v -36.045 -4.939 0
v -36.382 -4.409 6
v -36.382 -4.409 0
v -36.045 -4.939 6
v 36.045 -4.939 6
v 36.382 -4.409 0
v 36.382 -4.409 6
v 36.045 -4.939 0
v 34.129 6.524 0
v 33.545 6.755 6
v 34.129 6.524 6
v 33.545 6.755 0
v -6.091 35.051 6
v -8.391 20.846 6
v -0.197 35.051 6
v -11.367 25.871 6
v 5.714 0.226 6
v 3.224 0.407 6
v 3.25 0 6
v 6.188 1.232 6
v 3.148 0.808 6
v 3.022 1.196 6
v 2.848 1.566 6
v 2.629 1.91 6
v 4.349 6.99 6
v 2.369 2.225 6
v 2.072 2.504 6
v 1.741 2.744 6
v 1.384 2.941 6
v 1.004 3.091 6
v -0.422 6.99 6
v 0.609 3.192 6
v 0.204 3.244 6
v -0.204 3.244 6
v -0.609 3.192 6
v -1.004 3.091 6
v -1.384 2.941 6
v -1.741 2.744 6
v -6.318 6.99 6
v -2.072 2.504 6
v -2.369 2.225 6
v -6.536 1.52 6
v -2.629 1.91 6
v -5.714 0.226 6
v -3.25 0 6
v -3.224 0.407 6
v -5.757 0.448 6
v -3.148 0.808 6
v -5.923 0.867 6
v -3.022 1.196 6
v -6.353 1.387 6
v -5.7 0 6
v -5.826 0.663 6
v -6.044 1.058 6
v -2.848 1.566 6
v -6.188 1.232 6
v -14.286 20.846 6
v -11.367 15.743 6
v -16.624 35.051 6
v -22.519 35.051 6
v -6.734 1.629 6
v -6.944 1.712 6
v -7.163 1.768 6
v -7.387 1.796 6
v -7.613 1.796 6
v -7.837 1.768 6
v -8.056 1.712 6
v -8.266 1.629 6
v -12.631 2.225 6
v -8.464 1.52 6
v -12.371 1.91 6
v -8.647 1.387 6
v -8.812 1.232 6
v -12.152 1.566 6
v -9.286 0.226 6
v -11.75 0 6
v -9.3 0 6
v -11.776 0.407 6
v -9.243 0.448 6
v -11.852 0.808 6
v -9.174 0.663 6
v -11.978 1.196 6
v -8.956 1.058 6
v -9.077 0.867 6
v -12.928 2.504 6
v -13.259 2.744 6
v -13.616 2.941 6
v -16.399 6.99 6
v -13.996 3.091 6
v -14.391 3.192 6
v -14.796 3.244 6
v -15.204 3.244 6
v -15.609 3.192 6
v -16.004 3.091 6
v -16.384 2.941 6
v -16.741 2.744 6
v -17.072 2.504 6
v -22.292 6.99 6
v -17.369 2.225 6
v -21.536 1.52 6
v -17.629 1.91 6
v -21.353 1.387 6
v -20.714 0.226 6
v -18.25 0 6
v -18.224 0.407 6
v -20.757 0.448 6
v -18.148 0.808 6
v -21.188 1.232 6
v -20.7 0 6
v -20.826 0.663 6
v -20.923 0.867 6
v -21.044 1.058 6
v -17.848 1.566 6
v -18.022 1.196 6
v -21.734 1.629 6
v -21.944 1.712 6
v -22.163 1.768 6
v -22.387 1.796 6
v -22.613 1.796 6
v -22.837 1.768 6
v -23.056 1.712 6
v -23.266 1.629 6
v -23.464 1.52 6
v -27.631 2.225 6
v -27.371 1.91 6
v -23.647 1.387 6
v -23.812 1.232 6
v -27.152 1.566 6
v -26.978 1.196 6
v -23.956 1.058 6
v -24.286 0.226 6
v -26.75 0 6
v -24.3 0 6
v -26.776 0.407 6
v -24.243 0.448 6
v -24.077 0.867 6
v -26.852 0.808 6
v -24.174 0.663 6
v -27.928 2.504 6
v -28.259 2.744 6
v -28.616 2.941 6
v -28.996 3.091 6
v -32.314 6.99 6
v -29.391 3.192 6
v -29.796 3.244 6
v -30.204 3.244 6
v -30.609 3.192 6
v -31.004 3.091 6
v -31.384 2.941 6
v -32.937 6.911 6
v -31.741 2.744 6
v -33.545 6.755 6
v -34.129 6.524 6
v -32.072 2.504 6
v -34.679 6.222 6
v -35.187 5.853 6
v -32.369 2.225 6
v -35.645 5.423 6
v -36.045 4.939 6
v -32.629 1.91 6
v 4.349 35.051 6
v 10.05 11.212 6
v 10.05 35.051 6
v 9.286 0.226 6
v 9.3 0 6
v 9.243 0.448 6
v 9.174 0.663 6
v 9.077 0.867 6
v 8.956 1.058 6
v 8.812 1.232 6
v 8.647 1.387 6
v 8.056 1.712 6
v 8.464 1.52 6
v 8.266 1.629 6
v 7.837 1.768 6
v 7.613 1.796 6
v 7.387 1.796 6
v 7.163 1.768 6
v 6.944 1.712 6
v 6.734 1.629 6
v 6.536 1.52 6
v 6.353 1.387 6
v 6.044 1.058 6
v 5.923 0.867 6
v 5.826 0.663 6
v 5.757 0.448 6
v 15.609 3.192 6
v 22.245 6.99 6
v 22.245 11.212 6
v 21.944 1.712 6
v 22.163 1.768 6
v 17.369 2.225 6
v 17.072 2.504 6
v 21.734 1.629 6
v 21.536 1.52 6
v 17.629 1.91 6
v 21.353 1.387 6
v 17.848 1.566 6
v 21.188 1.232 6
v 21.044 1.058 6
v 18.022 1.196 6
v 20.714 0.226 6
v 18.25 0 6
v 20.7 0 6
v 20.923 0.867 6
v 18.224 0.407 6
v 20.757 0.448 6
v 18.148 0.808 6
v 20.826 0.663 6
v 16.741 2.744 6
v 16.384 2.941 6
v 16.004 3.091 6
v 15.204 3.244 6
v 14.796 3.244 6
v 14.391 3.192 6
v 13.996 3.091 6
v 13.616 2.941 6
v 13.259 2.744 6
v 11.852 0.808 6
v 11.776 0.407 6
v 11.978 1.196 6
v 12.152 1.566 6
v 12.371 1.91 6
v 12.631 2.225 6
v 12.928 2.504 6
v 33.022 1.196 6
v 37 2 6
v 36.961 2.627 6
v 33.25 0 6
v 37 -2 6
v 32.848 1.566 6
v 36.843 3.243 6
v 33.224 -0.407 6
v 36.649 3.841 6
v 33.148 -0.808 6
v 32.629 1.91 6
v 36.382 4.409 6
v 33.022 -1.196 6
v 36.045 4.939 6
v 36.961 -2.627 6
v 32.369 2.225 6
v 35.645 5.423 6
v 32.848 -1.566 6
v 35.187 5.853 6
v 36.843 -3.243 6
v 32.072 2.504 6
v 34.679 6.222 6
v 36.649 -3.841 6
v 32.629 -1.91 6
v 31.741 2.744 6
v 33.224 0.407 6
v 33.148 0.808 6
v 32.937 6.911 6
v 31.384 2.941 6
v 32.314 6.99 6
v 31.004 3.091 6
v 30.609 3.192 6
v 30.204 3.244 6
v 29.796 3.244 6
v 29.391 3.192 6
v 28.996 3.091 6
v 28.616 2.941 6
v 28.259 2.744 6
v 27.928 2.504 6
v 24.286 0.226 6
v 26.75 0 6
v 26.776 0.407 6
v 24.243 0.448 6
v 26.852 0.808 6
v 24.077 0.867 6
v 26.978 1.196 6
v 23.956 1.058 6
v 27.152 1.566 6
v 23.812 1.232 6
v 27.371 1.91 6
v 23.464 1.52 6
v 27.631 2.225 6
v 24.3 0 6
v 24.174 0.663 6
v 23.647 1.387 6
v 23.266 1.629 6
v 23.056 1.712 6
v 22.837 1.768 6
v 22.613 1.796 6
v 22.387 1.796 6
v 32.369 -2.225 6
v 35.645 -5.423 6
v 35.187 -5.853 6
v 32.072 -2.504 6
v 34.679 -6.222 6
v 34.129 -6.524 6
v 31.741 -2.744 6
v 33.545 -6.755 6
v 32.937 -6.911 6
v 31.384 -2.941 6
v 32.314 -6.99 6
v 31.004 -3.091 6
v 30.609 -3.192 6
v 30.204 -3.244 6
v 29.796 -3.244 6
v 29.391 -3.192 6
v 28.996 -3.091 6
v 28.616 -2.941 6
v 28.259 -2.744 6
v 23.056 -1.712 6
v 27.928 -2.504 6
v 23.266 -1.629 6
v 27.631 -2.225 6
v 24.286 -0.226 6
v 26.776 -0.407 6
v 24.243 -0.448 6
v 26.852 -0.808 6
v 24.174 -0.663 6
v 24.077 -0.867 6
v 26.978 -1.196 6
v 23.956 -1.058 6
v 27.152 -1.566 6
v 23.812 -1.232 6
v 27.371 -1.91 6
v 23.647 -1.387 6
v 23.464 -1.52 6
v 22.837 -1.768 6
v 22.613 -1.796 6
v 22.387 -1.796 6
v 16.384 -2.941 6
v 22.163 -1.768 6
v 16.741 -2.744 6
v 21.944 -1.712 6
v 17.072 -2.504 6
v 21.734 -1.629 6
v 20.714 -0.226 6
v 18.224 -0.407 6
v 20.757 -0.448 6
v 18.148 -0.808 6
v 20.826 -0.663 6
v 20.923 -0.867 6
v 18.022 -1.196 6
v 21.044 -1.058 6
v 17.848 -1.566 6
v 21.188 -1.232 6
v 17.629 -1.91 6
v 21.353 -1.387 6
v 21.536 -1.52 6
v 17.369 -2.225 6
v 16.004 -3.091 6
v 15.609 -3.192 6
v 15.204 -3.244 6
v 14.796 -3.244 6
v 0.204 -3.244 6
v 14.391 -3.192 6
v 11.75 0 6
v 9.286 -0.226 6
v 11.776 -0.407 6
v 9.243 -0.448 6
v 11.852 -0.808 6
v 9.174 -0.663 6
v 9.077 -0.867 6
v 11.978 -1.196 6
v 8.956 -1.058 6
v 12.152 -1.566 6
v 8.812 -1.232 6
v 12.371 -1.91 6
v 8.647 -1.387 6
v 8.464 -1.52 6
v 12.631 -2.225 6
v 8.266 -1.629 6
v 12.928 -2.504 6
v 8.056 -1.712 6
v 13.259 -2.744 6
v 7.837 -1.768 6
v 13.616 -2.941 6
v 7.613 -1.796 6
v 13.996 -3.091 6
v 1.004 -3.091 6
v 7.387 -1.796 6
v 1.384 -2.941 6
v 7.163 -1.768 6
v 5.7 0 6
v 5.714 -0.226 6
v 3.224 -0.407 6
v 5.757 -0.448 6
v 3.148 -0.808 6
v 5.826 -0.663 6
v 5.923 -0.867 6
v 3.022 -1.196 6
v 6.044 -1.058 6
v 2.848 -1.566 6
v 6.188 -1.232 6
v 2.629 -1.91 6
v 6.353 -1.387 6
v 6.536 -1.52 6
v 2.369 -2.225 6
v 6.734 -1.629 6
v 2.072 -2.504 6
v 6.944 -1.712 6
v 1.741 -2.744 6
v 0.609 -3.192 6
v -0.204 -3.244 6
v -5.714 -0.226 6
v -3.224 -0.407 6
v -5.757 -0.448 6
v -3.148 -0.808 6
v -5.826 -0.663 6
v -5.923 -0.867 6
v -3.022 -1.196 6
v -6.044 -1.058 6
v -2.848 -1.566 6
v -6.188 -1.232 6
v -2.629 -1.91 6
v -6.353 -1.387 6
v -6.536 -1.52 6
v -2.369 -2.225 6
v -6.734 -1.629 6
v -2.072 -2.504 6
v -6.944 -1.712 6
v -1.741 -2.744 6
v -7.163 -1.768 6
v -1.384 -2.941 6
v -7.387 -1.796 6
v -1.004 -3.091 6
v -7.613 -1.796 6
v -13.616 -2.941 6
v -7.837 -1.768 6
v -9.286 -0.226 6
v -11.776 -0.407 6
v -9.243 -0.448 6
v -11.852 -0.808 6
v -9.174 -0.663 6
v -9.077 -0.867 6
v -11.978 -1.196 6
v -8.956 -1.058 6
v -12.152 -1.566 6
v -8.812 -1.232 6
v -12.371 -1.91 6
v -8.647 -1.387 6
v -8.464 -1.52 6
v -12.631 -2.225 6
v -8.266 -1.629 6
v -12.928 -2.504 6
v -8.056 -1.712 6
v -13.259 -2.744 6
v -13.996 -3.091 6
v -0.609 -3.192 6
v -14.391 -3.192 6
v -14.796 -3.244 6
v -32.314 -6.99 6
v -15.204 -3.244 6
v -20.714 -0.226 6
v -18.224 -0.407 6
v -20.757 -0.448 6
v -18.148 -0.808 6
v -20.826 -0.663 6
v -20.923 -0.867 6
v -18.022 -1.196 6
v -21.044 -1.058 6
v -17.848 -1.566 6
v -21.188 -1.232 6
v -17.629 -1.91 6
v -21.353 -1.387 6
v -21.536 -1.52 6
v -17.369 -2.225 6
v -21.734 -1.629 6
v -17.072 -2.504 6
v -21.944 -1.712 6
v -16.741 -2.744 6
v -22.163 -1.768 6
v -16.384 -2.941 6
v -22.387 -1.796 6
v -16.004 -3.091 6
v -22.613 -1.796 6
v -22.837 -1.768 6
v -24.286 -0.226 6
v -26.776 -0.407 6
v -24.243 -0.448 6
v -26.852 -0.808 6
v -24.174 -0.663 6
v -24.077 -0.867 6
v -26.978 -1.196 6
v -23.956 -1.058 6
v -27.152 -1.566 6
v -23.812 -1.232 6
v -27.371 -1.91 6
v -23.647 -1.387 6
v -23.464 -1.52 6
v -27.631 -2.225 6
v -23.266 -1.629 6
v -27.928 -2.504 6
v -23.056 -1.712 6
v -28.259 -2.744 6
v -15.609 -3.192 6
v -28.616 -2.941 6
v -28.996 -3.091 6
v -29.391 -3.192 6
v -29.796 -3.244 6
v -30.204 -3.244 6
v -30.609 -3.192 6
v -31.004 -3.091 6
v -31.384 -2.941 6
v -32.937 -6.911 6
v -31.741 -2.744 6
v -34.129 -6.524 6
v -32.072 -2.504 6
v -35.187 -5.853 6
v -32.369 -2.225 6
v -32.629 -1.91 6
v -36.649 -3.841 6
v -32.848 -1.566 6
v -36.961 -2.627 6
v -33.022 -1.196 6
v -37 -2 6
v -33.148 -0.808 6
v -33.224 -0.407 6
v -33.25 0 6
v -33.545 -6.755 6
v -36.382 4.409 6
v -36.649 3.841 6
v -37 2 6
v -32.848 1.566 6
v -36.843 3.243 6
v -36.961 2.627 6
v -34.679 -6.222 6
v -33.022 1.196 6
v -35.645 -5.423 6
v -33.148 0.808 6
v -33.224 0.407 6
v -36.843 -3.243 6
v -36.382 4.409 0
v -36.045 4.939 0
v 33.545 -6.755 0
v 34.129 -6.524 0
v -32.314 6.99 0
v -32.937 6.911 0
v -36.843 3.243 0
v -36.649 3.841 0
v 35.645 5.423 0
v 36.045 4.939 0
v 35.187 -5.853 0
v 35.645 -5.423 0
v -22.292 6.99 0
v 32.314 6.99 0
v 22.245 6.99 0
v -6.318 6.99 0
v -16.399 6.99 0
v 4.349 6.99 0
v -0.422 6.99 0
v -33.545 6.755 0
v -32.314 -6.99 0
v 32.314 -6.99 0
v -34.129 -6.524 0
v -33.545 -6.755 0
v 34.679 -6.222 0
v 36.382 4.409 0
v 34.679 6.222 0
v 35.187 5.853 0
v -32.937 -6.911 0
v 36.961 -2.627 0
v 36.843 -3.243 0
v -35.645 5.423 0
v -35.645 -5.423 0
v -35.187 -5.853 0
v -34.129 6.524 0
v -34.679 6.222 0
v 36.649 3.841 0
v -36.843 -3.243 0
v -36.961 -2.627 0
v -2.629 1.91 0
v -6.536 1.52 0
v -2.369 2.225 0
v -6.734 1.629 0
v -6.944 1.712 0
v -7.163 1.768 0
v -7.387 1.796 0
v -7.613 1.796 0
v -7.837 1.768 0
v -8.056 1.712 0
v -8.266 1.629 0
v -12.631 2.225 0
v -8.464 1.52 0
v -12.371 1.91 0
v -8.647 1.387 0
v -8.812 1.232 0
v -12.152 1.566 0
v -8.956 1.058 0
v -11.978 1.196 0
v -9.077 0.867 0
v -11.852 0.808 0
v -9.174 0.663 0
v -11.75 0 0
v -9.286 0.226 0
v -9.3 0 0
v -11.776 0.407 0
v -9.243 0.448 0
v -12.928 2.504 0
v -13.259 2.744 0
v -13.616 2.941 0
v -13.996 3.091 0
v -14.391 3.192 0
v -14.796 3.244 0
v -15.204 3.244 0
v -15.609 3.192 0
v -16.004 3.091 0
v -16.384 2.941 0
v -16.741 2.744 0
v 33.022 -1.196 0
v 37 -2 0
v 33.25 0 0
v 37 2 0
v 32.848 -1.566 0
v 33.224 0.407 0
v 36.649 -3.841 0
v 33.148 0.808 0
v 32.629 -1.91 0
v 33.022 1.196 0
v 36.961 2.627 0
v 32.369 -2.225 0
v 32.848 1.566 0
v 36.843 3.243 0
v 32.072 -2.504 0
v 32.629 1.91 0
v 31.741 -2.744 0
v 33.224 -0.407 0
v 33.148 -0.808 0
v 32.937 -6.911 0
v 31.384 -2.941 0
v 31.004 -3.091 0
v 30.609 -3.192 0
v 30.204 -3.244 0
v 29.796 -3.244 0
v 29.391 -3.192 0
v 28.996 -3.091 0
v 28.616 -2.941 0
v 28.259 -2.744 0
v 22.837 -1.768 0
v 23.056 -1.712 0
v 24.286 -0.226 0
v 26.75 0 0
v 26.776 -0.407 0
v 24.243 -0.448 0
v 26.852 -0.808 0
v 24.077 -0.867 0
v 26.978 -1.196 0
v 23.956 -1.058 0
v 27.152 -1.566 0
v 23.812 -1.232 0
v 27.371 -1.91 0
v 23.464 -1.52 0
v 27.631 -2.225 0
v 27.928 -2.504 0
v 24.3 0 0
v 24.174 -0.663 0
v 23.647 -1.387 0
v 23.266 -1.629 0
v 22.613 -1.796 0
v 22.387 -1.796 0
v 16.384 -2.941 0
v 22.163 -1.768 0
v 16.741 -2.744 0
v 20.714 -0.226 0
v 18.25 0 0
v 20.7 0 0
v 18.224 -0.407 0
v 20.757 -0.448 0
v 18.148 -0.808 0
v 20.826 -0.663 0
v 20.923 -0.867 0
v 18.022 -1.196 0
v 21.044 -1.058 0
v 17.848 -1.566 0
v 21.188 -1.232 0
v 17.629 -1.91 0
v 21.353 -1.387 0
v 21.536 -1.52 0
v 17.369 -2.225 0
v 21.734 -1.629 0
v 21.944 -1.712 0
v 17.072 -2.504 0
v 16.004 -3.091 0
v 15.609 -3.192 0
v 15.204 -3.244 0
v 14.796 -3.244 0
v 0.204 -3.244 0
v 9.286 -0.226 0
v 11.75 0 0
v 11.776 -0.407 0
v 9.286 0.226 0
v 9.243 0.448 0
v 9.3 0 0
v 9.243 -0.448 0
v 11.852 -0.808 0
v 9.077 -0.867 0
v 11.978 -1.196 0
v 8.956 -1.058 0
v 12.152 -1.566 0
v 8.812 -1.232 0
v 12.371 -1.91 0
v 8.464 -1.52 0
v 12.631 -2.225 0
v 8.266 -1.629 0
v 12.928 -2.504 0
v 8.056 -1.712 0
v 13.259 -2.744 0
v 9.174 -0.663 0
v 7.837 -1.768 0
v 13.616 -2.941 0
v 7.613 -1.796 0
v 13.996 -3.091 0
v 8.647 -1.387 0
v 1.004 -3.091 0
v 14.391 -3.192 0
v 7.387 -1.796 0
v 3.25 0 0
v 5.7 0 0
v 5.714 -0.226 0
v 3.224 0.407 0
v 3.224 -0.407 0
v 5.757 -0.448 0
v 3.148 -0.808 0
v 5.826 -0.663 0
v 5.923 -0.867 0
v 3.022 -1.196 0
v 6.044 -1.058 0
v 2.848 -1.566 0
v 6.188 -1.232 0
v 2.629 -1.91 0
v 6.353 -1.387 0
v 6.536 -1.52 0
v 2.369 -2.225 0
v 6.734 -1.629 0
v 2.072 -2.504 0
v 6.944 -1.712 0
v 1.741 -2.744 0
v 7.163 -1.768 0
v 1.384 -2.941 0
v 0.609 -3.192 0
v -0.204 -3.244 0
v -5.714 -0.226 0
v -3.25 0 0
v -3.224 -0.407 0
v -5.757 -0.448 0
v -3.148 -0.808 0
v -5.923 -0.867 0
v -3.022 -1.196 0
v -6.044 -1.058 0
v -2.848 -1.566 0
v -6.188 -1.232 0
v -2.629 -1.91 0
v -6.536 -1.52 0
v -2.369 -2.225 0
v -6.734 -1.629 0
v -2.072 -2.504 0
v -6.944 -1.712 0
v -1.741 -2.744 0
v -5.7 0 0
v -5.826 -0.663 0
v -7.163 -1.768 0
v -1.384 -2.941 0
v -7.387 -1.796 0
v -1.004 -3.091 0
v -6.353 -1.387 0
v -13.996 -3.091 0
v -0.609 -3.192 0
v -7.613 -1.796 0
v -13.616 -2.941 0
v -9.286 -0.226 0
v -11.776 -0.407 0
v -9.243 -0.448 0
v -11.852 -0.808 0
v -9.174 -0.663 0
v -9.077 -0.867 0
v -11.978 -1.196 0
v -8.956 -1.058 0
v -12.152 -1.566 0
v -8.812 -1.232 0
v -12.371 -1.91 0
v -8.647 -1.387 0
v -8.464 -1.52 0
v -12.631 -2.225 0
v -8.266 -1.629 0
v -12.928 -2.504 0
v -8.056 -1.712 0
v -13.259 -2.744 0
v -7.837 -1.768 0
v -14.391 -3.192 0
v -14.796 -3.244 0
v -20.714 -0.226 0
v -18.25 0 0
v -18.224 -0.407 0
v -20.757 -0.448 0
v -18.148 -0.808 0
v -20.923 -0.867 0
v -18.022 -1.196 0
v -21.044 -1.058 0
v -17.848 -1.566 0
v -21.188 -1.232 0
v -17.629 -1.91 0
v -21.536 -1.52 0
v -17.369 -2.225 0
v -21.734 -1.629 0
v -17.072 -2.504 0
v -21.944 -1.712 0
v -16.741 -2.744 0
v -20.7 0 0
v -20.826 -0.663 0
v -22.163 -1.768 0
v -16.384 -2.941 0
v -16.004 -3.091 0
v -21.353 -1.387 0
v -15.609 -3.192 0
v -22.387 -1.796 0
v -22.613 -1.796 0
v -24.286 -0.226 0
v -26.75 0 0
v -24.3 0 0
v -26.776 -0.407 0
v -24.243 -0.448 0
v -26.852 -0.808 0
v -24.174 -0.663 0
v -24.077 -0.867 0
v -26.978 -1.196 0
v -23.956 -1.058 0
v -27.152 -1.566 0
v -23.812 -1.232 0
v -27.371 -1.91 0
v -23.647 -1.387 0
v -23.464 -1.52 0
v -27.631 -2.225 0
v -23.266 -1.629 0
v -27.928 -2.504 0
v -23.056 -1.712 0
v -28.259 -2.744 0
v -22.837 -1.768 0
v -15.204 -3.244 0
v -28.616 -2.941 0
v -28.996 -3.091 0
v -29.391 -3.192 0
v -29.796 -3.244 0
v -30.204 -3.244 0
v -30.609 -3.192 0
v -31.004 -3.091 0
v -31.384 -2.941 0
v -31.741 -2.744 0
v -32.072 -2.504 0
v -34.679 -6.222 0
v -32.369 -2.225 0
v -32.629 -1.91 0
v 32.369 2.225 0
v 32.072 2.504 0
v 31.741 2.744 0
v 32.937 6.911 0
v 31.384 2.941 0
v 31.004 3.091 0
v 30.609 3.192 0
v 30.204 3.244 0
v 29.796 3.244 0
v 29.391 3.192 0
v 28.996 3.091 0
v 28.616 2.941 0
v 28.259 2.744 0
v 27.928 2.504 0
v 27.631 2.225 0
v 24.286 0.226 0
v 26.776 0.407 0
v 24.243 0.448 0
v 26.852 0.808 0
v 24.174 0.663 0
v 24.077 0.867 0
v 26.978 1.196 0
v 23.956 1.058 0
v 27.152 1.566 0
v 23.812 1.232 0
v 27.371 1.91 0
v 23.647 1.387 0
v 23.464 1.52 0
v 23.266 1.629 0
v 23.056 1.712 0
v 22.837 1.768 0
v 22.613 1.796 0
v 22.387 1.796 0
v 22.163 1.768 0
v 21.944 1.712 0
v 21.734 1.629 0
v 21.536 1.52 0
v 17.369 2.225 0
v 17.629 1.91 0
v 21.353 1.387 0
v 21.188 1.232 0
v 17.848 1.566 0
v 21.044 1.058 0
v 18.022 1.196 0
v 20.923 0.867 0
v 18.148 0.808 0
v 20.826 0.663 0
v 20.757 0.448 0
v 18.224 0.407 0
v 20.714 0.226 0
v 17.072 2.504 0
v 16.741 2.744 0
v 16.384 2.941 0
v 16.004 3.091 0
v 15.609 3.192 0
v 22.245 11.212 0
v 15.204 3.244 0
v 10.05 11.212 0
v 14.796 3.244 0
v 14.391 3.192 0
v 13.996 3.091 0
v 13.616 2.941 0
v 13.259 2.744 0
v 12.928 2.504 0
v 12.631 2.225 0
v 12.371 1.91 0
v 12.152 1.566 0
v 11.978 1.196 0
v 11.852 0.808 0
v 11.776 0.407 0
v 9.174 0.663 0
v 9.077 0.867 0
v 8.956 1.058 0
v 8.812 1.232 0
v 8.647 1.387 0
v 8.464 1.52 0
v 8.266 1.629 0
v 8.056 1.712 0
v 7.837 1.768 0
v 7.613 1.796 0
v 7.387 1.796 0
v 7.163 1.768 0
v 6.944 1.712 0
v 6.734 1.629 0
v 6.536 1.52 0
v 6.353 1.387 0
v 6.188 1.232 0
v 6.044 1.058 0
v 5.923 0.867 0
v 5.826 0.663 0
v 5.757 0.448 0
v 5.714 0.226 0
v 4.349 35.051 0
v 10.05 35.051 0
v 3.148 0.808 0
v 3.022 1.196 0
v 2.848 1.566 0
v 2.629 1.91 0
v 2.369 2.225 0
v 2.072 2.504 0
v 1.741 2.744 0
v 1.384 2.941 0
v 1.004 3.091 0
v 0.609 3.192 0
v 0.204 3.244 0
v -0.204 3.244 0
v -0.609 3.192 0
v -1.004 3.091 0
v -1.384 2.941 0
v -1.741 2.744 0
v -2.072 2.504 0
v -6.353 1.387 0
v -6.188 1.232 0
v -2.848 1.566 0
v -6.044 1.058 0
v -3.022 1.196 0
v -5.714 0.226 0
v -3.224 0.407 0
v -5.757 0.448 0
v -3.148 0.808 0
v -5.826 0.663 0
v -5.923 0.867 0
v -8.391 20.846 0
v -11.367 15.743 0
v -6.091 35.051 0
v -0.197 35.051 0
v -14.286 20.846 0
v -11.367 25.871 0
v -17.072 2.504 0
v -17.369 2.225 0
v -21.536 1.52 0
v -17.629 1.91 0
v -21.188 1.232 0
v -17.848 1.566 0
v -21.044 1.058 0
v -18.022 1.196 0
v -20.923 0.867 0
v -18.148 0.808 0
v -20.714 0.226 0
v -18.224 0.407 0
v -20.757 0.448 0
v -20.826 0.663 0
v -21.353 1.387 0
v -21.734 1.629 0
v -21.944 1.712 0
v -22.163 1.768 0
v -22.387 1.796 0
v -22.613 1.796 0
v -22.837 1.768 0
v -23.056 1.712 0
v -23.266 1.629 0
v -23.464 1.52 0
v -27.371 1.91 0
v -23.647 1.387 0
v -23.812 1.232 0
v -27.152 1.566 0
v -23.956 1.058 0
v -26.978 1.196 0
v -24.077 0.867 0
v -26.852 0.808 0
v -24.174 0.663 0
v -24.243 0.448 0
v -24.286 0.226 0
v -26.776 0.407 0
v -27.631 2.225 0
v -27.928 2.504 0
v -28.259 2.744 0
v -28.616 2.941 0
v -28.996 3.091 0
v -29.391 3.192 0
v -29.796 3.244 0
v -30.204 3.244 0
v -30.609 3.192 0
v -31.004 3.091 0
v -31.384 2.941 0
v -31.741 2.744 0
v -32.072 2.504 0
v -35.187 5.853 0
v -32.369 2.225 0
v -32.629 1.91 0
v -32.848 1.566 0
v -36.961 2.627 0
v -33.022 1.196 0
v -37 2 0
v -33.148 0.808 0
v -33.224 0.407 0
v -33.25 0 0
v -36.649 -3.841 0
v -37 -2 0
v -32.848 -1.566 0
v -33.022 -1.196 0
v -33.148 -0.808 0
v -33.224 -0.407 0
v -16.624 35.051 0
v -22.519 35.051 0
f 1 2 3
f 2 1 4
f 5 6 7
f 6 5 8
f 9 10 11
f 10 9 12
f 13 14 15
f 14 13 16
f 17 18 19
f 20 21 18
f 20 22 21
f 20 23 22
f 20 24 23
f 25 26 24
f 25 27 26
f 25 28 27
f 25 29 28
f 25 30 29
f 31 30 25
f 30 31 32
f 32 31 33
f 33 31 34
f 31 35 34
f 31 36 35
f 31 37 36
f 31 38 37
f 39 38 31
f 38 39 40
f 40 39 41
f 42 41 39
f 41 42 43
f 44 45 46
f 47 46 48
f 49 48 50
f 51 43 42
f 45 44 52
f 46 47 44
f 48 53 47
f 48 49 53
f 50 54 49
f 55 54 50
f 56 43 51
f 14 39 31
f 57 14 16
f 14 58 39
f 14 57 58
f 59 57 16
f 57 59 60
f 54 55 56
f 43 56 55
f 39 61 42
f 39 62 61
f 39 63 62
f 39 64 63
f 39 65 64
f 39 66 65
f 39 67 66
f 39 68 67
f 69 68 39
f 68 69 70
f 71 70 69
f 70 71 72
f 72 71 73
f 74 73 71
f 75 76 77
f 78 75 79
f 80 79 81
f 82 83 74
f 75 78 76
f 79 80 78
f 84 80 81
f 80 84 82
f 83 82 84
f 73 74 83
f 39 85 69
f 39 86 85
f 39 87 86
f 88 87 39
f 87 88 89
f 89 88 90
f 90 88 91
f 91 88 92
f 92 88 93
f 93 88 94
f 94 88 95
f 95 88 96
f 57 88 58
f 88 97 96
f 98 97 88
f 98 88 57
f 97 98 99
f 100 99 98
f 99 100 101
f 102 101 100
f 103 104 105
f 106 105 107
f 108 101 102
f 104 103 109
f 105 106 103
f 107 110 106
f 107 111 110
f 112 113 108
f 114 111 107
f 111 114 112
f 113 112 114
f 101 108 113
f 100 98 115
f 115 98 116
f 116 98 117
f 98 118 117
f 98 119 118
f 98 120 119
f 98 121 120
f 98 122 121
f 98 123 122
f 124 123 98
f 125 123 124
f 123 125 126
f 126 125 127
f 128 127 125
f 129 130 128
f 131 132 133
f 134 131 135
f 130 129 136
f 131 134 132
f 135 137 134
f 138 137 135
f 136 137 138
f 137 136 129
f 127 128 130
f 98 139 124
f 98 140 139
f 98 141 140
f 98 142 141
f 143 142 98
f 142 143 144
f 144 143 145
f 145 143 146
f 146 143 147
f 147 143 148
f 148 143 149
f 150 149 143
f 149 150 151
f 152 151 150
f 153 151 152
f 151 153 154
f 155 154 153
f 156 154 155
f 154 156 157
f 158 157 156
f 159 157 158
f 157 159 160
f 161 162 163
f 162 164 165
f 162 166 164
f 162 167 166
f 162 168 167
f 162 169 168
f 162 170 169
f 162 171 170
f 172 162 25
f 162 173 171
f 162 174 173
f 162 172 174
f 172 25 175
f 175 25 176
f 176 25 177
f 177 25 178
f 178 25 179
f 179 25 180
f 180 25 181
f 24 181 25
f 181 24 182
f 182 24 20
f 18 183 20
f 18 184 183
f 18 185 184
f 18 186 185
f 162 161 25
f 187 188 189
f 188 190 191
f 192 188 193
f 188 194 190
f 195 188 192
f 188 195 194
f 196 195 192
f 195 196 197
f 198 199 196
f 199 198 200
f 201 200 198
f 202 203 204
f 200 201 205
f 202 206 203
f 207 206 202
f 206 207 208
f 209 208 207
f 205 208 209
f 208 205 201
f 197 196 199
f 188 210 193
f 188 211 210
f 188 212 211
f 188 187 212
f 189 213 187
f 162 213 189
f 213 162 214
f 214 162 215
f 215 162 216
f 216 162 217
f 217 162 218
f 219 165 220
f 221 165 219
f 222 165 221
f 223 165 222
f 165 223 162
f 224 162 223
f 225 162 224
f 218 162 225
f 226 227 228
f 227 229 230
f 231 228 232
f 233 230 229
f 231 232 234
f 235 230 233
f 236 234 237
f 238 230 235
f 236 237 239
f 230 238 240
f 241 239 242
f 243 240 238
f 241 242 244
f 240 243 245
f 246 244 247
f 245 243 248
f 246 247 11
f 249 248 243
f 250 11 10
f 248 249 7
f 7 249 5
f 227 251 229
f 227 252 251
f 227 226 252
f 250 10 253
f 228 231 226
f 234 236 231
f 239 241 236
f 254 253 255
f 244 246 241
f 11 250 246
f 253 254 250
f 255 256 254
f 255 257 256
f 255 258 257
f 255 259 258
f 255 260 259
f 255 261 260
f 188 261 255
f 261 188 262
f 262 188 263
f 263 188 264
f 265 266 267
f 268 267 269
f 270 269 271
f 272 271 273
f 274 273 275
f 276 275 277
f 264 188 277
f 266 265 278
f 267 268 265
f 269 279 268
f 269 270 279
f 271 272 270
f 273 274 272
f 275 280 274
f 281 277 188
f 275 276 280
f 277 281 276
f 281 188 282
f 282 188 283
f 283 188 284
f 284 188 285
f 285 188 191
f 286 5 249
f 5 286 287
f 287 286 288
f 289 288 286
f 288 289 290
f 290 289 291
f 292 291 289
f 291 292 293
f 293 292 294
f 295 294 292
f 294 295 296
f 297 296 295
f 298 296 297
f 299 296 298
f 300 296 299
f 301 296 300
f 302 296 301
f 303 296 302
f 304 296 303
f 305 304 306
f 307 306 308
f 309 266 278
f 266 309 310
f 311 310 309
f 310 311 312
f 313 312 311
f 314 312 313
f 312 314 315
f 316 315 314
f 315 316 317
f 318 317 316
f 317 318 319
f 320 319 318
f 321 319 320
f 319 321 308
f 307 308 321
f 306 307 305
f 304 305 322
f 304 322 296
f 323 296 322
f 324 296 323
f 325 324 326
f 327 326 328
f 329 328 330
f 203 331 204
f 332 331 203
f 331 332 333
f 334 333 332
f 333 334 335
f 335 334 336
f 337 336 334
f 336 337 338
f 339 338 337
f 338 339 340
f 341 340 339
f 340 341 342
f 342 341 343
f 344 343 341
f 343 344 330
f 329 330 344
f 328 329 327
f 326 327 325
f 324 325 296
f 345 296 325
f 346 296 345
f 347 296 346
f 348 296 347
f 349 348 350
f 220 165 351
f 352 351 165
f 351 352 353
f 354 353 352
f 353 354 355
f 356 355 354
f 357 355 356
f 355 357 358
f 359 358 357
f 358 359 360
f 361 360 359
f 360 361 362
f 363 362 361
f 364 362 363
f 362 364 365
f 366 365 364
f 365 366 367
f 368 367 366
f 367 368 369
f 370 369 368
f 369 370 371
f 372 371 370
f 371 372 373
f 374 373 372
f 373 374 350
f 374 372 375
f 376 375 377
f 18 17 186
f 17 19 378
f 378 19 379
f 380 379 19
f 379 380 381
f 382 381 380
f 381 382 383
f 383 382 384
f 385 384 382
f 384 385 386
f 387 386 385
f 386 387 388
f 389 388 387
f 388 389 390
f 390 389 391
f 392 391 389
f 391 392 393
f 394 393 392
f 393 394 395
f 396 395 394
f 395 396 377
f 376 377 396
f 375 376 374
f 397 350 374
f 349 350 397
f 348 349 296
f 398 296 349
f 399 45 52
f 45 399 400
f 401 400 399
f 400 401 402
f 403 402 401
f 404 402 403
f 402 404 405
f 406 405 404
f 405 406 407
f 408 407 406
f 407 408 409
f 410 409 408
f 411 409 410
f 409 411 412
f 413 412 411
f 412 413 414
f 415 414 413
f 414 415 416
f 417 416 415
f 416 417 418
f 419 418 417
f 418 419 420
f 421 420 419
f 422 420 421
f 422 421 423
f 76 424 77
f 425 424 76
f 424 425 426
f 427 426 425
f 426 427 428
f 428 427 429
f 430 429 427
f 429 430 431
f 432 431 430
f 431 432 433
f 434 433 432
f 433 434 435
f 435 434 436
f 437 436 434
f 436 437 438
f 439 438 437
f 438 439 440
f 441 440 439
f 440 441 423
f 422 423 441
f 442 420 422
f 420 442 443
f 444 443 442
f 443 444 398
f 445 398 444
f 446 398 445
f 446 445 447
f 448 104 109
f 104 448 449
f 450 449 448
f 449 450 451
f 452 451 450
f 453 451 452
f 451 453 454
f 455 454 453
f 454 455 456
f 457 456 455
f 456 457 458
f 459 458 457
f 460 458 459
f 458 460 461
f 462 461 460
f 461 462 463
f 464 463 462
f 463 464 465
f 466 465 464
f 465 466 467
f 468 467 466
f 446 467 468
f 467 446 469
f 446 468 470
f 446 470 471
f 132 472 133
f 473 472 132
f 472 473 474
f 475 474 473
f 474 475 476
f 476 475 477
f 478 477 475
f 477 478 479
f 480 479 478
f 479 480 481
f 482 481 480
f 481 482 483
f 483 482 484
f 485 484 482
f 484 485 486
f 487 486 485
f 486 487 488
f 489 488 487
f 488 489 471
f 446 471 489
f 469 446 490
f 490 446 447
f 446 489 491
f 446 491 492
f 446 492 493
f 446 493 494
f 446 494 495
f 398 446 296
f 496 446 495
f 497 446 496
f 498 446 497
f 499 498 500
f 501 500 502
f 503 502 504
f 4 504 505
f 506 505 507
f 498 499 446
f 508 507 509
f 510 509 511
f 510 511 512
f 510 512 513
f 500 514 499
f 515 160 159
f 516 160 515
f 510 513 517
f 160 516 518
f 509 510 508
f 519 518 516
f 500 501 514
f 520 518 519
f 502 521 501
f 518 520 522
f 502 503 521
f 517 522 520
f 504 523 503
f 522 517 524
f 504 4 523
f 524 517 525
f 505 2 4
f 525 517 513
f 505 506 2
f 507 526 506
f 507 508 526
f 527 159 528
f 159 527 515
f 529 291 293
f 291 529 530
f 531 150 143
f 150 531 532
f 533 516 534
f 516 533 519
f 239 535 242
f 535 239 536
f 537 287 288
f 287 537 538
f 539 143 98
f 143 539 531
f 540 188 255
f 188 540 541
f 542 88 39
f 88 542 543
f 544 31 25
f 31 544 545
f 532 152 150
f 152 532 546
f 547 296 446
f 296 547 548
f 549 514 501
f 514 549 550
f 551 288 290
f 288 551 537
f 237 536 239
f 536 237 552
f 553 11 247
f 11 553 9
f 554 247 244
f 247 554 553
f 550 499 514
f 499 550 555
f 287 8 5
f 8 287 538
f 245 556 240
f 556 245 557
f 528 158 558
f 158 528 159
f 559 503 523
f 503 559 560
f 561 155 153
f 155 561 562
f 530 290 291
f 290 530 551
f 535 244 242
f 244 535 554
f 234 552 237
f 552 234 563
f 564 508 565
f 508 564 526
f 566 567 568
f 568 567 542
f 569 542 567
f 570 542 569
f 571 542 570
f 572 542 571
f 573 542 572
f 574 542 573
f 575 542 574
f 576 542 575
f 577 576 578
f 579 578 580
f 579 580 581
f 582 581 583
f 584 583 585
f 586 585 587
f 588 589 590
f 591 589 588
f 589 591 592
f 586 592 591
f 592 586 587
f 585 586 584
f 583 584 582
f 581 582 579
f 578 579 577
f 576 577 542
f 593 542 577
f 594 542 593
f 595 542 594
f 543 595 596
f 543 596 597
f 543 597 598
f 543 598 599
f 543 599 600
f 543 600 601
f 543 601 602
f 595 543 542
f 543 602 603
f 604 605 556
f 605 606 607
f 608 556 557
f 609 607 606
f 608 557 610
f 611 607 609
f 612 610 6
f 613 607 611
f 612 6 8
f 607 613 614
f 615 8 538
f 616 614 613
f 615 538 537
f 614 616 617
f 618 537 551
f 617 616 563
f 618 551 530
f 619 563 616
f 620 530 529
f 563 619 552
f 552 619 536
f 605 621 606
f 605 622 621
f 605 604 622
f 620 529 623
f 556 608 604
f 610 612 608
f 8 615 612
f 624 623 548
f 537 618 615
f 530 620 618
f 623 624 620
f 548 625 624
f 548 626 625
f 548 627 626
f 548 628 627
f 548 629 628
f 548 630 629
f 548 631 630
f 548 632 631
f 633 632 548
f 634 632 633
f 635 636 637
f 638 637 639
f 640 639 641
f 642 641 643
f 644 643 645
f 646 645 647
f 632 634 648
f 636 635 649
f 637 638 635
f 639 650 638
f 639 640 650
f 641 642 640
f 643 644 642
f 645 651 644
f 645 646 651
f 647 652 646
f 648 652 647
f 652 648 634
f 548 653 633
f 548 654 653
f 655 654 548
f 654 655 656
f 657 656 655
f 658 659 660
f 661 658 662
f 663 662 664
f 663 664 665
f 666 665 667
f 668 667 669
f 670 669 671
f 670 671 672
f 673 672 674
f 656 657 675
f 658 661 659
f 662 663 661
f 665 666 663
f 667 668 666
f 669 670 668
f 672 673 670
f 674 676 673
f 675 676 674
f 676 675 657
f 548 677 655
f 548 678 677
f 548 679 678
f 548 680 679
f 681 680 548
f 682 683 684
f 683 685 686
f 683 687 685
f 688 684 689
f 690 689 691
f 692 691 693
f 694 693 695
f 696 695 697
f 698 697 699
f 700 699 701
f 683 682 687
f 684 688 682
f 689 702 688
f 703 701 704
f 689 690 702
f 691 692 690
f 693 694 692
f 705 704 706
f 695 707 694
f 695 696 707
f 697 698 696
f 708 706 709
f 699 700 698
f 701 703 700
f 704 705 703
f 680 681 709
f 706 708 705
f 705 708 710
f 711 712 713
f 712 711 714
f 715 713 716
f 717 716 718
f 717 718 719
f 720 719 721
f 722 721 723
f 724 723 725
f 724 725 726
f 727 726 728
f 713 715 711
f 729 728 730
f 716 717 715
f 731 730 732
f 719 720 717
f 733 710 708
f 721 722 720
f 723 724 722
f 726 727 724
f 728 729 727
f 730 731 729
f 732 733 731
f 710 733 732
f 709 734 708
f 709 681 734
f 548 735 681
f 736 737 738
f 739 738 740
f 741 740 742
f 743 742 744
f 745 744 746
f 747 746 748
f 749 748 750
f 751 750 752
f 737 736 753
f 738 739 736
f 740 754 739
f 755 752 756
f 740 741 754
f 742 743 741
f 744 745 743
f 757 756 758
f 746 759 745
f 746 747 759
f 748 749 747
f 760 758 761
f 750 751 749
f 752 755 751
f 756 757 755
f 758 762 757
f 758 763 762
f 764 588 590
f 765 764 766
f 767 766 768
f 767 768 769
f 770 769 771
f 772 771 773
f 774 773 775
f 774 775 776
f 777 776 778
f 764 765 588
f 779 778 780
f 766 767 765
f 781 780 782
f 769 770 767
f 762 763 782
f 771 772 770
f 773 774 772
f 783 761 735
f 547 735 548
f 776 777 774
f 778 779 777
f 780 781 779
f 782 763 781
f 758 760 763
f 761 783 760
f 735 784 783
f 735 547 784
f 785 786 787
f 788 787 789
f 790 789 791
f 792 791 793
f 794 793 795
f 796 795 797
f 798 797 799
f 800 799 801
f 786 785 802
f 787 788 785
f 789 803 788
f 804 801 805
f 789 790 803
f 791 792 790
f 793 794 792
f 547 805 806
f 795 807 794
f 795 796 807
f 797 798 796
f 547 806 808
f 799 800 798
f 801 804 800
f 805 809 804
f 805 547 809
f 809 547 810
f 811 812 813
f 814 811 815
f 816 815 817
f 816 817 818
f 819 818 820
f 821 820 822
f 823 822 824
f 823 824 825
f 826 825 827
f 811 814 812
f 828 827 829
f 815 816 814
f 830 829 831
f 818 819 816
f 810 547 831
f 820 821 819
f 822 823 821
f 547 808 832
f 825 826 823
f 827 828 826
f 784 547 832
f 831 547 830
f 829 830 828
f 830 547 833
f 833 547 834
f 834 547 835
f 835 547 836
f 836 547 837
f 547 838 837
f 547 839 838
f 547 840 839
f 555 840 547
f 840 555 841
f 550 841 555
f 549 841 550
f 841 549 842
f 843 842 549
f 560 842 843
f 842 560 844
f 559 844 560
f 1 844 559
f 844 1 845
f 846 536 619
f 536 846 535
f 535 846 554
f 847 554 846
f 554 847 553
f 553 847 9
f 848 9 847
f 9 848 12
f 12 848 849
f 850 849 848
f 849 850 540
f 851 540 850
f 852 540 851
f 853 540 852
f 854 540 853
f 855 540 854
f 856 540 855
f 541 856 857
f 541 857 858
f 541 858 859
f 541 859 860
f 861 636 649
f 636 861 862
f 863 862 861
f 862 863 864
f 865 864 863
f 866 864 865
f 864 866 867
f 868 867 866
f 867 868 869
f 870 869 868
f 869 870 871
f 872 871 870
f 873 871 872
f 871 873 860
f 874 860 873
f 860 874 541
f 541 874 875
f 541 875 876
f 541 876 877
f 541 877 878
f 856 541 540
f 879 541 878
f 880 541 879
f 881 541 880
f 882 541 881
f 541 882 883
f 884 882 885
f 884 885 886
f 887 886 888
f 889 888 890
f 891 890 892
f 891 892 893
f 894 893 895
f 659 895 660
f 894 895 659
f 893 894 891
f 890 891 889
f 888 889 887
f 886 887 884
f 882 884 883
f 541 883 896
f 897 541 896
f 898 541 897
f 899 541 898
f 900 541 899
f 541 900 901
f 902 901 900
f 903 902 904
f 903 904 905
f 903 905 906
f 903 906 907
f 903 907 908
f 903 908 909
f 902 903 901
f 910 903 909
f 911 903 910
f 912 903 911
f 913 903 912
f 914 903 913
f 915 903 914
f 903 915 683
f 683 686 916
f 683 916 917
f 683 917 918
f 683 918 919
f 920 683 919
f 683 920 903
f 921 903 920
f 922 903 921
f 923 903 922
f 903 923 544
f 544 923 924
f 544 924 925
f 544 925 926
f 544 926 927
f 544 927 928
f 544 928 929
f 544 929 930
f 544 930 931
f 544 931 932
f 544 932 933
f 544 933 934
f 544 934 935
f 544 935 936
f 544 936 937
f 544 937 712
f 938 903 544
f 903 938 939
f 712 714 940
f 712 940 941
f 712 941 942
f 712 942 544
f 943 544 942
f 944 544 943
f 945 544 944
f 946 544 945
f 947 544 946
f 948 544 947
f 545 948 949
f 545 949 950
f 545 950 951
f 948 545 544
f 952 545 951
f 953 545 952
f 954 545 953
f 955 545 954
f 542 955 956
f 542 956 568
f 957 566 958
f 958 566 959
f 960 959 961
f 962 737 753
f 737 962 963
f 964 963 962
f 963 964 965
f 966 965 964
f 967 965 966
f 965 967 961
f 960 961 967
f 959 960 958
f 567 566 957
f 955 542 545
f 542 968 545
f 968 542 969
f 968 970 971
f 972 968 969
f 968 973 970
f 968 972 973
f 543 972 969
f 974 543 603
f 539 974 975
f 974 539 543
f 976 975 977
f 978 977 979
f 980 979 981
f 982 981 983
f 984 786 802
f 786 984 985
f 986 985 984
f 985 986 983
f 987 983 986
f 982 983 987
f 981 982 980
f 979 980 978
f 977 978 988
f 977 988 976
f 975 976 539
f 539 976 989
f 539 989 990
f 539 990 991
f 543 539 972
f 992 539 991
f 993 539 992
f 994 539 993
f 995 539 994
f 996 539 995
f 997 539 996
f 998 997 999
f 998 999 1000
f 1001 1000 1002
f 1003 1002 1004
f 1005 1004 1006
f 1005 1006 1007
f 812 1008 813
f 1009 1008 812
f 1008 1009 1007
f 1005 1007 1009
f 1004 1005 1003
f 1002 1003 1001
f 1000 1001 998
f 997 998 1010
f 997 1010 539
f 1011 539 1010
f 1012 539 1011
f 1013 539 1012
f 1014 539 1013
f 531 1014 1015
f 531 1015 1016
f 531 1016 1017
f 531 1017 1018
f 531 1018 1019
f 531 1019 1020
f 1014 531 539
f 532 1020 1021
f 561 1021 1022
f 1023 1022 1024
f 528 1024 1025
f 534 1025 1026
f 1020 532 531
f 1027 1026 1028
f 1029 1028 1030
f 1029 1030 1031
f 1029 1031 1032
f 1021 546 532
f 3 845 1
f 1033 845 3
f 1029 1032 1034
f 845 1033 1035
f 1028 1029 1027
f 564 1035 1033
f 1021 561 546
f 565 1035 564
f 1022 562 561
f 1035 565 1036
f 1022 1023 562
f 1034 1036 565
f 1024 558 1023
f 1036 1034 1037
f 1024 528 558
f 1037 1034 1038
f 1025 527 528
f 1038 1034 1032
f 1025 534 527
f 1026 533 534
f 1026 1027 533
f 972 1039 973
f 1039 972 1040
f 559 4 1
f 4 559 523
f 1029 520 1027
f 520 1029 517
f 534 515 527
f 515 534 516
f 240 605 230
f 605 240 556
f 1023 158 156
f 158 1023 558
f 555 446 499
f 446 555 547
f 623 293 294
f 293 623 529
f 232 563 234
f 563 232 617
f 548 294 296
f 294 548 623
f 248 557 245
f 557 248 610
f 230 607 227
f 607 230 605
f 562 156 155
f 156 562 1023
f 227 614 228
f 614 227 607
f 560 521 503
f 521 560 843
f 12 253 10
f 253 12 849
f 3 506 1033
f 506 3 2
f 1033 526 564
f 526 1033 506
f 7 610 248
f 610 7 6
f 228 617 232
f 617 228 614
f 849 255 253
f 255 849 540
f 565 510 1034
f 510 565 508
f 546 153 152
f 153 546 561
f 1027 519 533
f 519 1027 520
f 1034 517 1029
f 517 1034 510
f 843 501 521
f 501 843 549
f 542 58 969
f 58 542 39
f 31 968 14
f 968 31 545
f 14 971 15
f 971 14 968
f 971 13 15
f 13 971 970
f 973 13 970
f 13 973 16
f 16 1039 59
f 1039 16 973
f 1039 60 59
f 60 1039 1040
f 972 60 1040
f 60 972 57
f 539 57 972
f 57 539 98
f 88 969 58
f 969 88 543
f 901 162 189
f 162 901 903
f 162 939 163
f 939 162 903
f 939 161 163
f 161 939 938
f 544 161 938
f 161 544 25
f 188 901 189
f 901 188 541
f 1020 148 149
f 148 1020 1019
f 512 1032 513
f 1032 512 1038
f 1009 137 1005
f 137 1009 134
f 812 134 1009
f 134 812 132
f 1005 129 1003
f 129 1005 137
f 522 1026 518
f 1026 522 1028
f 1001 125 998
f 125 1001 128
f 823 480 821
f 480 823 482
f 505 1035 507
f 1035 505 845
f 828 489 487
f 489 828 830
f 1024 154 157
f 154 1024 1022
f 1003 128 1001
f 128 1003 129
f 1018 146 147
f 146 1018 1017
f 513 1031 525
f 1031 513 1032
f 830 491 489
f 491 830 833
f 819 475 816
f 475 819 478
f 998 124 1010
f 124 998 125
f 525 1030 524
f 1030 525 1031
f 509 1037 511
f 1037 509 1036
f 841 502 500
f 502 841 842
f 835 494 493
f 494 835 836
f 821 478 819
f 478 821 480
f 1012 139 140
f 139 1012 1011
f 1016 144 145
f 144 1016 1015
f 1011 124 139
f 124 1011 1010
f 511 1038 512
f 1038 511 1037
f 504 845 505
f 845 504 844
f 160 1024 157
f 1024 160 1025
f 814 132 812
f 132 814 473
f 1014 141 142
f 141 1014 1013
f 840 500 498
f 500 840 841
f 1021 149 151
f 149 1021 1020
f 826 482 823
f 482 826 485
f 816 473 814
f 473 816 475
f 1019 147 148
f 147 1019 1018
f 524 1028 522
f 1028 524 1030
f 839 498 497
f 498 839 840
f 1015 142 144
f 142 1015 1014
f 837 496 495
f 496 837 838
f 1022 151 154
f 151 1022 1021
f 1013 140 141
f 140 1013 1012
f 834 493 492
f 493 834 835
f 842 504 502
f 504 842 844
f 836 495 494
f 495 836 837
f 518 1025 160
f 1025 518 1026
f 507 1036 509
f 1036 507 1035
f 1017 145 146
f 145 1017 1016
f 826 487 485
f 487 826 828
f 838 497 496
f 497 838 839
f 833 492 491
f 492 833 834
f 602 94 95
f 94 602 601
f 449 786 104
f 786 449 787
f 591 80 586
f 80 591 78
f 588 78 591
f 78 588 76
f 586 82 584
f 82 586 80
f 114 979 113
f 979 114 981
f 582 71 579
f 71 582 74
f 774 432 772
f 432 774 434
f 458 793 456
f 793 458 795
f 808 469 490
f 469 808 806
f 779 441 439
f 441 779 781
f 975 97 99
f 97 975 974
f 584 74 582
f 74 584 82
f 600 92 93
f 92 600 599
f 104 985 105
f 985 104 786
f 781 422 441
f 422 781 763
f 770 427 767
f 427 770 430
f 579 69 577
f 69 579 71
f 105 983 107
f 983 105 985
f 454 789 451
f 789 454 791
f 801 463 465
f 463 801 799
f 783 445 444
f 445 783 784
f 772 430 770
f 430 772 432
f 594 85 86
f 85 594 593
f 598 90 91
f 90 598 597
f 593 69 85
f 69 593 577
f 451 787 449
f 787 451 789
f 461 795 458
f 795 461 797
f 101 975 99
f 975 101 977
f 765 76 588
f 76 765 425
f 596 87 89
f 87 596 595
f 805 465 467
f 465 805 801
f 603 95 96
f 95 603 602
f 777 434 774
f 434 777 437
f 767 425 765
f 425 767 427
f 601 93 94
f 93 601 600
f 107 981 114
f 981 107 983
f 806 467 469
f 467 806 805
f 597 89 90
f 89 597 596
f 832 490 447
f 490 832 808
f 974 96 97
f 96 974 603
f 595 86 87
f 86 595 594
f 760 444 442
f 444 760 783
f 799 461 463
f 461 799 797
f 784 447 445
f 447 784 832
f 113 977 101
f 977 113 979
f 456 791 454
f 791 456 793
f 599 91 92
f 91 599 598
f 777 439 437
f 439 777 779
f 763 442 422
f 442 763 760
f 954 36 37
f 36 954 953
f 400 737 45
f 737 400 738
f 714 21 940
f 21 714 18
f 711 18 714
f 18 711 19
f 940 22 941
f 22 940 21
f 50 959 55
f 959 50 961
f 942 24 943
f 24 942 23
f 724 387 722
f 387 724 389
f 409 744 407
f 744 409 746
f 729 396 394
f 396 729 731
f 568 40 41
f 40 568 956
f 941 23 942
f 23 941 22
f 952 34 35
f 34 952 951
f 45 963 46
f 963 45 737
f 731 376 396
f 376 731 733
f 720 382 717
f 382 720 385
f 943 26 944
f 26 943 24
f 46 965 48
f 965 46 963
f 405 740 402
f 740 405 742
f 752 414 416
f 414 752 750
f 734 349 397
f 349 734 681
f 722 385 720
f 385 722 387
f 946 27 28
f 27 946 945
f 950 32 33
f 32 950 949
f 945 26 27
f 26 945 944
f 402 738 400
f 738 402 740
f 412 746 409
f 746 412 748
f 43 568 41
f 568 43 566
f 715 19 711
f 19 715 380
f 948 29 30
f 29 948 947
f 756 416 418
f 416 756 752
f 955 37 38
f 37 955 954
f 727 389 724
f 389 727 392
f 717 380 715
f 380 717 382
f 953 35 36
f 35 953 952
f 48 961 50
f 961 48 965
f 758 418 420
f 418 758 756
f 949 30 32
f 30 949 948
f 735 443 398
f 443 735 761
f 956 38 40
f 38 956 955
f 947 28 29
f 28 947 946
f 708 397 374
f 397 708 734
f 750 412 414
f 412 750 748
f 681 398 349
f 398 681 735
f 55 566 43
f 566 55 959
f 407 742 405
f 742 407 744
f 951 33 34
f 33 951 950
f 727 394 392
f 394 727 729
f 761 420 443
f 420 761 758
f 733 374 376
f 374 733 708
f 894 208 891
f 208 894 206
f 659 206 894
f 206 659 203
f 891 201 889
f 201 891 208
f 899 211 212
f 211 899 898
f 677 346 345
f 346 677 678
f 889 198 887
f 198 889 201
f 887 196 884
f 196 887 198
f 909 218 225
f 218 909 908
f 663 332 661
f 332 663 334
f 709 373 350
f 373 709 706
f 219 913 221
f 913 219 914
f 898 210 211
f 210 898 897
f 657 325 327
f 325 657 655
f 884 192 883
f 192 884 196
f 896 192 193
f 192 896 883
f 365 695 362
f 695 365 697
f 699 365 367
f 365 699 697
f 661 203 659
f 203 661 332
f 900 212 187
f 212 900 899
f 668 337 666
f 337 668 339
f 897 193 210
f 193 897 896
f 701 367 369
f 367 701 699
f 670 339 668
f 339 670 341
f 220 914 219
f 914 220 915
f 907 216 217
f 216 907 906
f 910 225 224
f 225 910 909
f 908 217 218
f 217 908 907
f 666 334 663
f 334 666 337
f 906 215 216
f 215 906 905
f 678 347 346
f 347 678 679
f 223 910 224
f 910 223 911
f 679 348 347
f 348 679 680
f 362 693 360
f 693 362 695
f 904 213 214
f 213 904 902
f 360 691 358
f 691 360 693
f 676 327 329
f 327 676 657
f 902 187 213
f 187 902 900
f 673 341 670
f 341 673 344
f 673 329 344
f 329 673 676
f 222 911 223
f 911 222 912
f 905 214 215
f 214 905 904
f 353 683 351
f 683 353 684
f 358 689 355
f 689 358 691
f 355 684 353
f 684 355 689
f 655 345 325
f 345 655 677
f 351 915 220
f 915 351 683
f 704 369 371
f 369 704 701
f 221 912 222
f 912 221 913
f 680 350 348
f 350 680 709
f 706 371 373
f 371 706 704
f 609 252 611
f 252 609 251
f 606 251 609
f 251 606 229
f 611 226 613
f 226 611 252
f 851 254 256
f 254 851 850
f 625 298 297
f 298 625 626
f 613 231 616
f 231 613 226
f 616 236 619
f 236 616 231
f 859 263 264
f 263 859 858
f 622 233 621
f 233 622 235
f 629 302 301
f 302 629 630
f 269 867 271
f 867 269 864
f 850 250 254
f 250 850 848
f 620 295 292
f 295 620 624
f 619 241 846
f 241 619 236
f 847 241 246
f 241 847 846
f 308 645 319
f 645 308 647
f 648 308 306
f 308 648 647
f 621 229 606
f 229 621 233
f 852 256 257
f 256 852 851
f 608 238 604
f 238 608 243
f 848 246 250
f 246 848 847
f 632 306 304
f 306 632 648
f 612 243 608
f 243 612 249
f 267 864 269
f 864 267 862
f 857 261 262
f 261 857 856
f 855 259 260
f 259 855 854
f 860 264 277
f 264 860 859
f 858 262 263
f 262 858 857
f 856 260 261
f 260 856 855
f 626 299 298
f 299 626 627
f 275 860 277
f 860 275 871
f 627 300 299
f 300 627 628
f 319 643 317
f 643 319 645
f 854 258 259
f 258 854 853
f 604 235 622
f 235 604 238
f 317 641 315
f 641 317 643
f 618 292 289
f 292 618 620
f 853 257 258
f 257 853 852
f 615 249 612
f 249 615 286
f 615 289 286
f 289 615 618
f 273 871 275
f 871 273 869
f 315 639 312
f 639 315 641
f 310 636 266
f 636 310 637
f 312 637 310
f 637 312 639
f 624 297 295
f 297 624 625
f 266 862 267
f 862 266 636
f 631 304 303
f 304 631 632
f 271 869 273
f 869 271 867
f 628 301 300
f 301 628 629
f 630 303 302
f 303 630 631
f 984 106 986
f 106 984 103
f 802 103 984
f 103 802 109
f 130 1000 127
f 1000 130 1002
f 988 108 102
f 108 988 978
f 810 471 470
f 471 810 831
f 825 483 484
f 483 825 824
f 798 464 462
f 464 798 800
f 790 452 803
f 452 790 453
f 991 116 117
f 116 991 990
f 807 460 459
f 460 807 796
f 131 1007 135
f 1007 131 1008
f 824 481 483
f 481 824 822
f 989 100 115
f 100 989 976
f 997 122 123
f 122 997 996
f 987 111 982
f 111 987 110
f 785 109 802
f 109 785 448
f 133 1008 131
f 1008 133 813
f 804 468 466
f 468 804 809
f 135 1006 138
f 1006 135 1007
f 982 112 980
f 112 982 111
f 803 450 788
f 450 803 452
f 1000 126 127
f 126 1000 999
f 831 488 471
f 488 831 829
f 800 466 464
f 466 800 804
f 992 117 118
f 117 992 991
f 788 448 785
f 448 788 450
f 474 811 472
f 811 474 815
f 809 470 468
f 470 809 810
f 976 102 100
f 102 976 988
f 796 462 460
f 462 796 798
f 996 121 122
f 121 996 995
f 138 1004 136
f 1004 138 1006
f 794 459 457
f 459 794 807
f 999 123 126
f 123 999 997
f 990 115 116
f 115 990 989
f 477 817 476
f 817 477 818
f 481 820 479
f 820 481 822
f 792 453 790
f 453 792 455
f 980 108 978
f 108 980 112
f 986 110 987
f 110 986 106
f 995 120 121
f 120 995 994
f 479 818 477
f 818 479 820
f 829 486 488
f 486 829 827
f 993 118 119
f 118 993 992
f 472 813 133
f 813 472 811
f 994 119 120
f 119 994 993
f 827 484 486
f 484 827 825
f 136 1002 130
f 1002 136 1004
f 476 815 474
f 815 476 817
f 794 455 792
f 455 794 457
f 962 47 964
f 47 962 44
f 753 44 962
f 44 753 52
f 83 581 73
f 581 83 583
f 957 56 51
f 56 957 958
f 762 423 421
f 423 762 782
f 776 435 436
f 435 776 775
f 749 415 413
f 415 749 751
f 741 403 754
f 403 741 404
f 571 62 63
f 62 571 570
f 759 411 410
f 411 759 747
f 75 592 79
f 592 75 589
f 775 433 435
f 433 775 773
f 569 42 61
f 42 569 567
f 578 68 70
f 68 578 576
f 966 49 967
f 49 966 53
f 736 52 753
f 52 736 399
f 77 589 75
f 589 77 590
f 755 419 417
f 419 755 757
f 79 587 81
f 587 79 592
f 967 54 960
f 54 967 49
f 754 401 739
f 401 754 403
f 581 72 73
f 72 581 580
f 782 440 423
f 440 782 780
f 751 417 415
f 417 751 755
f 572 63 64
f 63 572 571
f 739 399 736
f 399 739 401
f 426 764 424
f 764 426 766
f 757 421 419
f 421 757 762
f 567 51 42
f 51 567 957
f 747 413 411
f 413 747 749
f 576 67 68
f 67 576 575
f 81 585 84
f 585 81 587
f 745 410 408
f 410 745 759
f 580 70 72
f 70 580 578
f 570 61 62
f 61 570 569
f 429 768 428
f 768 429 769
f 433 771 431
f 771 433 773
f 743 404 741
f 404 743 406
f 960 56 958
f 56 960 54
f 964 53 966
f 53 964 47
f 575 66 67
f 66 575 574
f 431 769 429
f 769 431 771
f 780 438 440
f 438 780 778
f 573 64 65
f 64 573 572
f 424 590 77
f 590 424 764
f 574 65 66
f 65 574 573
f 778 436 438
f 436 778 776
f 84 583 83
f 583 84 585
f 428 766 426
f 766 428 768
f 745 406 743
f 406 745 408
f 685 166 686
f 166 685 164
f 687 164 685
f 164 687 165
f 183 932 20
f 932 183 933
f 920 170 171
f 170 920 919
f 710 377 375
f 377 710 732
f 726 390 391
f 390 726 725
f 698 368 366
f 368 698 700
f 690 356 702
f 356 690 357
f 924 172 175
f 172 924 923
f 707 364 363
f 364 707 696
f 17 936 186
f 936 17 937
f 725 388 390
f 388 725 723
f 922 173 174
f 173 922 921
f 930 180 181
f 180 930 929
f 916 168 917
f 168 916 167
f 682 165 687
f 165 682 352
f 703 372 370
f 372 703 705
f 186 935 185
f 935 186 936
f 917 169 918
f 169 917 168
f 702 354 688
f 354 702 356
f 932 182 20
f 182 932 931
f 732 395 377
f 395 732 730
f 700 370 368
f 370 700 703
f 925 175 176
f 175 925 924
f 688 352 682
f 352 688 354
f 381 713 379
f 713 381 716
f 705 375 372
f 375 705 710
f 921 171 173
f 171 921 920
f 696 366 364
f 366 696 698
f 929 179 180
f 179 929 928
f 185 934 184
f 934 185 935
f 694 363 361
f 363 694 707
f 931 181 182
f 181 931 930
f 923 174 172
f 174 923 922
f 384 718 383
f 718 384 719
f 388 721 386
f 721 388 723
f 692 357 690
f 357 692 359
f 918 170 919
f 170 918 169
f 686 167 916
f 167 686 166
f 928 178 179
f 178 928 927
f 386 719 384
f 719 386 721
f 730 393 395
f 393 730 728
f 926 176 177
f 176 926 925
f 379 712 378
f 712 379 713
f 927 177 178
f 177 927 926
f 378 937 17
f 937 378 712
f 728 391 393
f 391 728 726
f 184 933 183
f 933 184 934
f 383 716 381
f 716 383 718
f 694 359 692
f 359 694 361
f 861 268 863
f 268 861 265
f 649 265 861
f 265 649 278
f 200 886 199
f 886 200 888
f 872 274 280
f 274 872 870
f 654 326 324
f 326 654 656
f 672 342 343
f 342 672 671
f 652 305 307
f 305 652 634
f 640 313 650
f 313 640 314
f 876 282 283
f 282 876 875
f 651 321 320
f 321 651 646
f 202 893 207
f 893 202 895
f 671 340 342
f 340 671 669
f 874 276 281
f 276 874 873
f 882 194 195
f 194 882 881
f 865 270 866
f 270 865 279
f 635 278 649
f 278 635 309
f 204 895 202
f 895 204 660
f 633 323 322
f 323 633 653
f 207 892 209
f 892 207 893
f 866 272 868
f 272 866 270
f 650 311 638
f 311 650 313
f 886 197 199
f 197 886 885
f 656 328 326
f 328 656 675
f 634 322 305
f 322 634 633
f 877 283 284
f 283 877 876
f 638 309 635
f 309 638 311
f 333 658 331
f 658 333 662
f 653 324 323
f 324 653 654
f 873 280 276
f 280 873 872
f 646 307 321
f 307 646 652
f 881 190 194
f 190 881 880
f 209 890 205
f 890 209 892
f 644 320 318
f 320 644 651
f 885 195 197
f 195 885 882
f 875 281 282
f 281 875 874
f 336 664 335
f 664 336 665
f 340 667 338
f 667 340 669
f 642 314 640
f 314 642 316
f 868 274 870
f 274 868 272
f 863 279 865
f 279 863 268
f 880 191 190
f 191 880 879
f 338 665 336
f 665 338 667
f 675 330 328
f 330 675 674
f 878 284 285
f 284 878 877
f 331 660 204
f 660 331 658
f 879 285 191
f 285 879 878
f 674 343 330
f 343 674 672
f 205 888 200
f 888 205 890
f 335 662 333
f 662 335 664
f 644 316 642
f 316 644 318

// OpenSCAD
$fn = 50;


difference() {
	union() {
		hull() {
			translate(v = [-32.0000000000, 2.0000000000, 0]) {
				cylinder(h = 6, r = 5);
			}
			translate(v = [32.0000000000, 2.0000000000, 0]) {
				cylinder(h = 6, r = 5);
			}
			translate(v = [-32.0000000000, -2.0000000000, 0]) {
				cylinder(h = 6, r = 5);
			}
			translate(v = [32.0000000000, -2.0000000000, 0]) {
				cylinder(h = 6, r = 5);
			}
		}
		translate(v = [0, 34.3750000000, 0]) {
			linear_extrude(height = 6) {
				text(font = "DejaVu Sans Mono:style=Bold", halign = "center", size = 28.5000000000, text = "XL", valign = "top");
			}
		}
	}
	union() {
		translate(v = [-30.0000000000, 0.0000000000, 0]) {
			translate(v = [0, 0, -100]) {
				cylinder(h = 200, r = 3.2500000000);
			}
		}
		translate(v = [-15.0000000000, 0.0000000000, 0]) {
			translate(v = [0, 0, -100]) {
				cylinder(h = 200, r = 3.2500000000);
			}
		}
		translate(v = [0, 0, -100]) {
			cylinder(h = 200, r = 3.2500000000);
		}
		translate(v = [15.0000000000, 0.0000000000, 0]) {
			translate(v = [0, 0, -100]) {
				cylinder(h = 200, r = 3.2500000000);
			}
		}
		translate(v = [30.0000000000, 0.0000000000, 0]) {
			translate(v = [0, 0, -100]) {
				cylinder(h = 200, r = 3.2500000000);
			}
		}
		translate(v = [-30.0000000000, 0.0000000000, 0]) {
			translate(v = [0, 0, -100]) {
				cylinder(h = 200, r = 1.8000000000);
			}
		}
		translate(v = [-22.5000000000, 0.0000000000, 0]) {
			translate(v = [0, 0, -100]) {
				cylinder(h = 200, r = 1.8000000000);
			}
		}
		translate(v = [-15.0000000000, 0.0000000000, 0]) {
			translate(v = [0, 0, -100]) {
				cylinder(h = 200, r = 1.8000000000);
			}
		}
		translate(v = [-7.5000000000, 0.0000000000, 0]) {
			translate(v = [0, 0, -100]) {
				cylinder(h = 200, r = 1.8000000000);
			}
		}
		translate(v = [0, 0, -100]) {
			cylinder(h = 200, r = 1.8000000000);
		}
		translate(v = [7.5000000000, 0.0000000000, 0]) {
			translate(v = [0, 0, -100]) {
				cylinder(h = 200, r = 1.8000000000);
			}
		}
		translate(v = [15.0000000000, 0.0000000000, 0]) {
			translate(v = [0, 0, -100]) {
				cylinder(h = 200, r = 1.8000000000);
			}
		}
		translate(v = [22.5000000000, 0.0000000000, 0]) {
			translate(v = [0, 0, -100]) {
				cylinder(h = 200, r = 1.8000000000);
			}
		}
		translate(v = [30.0000000000, 0.0000000000, 0]) {
			translate(v = [0, 0, -100]) {
				cylinder(h = 200, r = 1.8000000000);
			}
		}
	}
}
